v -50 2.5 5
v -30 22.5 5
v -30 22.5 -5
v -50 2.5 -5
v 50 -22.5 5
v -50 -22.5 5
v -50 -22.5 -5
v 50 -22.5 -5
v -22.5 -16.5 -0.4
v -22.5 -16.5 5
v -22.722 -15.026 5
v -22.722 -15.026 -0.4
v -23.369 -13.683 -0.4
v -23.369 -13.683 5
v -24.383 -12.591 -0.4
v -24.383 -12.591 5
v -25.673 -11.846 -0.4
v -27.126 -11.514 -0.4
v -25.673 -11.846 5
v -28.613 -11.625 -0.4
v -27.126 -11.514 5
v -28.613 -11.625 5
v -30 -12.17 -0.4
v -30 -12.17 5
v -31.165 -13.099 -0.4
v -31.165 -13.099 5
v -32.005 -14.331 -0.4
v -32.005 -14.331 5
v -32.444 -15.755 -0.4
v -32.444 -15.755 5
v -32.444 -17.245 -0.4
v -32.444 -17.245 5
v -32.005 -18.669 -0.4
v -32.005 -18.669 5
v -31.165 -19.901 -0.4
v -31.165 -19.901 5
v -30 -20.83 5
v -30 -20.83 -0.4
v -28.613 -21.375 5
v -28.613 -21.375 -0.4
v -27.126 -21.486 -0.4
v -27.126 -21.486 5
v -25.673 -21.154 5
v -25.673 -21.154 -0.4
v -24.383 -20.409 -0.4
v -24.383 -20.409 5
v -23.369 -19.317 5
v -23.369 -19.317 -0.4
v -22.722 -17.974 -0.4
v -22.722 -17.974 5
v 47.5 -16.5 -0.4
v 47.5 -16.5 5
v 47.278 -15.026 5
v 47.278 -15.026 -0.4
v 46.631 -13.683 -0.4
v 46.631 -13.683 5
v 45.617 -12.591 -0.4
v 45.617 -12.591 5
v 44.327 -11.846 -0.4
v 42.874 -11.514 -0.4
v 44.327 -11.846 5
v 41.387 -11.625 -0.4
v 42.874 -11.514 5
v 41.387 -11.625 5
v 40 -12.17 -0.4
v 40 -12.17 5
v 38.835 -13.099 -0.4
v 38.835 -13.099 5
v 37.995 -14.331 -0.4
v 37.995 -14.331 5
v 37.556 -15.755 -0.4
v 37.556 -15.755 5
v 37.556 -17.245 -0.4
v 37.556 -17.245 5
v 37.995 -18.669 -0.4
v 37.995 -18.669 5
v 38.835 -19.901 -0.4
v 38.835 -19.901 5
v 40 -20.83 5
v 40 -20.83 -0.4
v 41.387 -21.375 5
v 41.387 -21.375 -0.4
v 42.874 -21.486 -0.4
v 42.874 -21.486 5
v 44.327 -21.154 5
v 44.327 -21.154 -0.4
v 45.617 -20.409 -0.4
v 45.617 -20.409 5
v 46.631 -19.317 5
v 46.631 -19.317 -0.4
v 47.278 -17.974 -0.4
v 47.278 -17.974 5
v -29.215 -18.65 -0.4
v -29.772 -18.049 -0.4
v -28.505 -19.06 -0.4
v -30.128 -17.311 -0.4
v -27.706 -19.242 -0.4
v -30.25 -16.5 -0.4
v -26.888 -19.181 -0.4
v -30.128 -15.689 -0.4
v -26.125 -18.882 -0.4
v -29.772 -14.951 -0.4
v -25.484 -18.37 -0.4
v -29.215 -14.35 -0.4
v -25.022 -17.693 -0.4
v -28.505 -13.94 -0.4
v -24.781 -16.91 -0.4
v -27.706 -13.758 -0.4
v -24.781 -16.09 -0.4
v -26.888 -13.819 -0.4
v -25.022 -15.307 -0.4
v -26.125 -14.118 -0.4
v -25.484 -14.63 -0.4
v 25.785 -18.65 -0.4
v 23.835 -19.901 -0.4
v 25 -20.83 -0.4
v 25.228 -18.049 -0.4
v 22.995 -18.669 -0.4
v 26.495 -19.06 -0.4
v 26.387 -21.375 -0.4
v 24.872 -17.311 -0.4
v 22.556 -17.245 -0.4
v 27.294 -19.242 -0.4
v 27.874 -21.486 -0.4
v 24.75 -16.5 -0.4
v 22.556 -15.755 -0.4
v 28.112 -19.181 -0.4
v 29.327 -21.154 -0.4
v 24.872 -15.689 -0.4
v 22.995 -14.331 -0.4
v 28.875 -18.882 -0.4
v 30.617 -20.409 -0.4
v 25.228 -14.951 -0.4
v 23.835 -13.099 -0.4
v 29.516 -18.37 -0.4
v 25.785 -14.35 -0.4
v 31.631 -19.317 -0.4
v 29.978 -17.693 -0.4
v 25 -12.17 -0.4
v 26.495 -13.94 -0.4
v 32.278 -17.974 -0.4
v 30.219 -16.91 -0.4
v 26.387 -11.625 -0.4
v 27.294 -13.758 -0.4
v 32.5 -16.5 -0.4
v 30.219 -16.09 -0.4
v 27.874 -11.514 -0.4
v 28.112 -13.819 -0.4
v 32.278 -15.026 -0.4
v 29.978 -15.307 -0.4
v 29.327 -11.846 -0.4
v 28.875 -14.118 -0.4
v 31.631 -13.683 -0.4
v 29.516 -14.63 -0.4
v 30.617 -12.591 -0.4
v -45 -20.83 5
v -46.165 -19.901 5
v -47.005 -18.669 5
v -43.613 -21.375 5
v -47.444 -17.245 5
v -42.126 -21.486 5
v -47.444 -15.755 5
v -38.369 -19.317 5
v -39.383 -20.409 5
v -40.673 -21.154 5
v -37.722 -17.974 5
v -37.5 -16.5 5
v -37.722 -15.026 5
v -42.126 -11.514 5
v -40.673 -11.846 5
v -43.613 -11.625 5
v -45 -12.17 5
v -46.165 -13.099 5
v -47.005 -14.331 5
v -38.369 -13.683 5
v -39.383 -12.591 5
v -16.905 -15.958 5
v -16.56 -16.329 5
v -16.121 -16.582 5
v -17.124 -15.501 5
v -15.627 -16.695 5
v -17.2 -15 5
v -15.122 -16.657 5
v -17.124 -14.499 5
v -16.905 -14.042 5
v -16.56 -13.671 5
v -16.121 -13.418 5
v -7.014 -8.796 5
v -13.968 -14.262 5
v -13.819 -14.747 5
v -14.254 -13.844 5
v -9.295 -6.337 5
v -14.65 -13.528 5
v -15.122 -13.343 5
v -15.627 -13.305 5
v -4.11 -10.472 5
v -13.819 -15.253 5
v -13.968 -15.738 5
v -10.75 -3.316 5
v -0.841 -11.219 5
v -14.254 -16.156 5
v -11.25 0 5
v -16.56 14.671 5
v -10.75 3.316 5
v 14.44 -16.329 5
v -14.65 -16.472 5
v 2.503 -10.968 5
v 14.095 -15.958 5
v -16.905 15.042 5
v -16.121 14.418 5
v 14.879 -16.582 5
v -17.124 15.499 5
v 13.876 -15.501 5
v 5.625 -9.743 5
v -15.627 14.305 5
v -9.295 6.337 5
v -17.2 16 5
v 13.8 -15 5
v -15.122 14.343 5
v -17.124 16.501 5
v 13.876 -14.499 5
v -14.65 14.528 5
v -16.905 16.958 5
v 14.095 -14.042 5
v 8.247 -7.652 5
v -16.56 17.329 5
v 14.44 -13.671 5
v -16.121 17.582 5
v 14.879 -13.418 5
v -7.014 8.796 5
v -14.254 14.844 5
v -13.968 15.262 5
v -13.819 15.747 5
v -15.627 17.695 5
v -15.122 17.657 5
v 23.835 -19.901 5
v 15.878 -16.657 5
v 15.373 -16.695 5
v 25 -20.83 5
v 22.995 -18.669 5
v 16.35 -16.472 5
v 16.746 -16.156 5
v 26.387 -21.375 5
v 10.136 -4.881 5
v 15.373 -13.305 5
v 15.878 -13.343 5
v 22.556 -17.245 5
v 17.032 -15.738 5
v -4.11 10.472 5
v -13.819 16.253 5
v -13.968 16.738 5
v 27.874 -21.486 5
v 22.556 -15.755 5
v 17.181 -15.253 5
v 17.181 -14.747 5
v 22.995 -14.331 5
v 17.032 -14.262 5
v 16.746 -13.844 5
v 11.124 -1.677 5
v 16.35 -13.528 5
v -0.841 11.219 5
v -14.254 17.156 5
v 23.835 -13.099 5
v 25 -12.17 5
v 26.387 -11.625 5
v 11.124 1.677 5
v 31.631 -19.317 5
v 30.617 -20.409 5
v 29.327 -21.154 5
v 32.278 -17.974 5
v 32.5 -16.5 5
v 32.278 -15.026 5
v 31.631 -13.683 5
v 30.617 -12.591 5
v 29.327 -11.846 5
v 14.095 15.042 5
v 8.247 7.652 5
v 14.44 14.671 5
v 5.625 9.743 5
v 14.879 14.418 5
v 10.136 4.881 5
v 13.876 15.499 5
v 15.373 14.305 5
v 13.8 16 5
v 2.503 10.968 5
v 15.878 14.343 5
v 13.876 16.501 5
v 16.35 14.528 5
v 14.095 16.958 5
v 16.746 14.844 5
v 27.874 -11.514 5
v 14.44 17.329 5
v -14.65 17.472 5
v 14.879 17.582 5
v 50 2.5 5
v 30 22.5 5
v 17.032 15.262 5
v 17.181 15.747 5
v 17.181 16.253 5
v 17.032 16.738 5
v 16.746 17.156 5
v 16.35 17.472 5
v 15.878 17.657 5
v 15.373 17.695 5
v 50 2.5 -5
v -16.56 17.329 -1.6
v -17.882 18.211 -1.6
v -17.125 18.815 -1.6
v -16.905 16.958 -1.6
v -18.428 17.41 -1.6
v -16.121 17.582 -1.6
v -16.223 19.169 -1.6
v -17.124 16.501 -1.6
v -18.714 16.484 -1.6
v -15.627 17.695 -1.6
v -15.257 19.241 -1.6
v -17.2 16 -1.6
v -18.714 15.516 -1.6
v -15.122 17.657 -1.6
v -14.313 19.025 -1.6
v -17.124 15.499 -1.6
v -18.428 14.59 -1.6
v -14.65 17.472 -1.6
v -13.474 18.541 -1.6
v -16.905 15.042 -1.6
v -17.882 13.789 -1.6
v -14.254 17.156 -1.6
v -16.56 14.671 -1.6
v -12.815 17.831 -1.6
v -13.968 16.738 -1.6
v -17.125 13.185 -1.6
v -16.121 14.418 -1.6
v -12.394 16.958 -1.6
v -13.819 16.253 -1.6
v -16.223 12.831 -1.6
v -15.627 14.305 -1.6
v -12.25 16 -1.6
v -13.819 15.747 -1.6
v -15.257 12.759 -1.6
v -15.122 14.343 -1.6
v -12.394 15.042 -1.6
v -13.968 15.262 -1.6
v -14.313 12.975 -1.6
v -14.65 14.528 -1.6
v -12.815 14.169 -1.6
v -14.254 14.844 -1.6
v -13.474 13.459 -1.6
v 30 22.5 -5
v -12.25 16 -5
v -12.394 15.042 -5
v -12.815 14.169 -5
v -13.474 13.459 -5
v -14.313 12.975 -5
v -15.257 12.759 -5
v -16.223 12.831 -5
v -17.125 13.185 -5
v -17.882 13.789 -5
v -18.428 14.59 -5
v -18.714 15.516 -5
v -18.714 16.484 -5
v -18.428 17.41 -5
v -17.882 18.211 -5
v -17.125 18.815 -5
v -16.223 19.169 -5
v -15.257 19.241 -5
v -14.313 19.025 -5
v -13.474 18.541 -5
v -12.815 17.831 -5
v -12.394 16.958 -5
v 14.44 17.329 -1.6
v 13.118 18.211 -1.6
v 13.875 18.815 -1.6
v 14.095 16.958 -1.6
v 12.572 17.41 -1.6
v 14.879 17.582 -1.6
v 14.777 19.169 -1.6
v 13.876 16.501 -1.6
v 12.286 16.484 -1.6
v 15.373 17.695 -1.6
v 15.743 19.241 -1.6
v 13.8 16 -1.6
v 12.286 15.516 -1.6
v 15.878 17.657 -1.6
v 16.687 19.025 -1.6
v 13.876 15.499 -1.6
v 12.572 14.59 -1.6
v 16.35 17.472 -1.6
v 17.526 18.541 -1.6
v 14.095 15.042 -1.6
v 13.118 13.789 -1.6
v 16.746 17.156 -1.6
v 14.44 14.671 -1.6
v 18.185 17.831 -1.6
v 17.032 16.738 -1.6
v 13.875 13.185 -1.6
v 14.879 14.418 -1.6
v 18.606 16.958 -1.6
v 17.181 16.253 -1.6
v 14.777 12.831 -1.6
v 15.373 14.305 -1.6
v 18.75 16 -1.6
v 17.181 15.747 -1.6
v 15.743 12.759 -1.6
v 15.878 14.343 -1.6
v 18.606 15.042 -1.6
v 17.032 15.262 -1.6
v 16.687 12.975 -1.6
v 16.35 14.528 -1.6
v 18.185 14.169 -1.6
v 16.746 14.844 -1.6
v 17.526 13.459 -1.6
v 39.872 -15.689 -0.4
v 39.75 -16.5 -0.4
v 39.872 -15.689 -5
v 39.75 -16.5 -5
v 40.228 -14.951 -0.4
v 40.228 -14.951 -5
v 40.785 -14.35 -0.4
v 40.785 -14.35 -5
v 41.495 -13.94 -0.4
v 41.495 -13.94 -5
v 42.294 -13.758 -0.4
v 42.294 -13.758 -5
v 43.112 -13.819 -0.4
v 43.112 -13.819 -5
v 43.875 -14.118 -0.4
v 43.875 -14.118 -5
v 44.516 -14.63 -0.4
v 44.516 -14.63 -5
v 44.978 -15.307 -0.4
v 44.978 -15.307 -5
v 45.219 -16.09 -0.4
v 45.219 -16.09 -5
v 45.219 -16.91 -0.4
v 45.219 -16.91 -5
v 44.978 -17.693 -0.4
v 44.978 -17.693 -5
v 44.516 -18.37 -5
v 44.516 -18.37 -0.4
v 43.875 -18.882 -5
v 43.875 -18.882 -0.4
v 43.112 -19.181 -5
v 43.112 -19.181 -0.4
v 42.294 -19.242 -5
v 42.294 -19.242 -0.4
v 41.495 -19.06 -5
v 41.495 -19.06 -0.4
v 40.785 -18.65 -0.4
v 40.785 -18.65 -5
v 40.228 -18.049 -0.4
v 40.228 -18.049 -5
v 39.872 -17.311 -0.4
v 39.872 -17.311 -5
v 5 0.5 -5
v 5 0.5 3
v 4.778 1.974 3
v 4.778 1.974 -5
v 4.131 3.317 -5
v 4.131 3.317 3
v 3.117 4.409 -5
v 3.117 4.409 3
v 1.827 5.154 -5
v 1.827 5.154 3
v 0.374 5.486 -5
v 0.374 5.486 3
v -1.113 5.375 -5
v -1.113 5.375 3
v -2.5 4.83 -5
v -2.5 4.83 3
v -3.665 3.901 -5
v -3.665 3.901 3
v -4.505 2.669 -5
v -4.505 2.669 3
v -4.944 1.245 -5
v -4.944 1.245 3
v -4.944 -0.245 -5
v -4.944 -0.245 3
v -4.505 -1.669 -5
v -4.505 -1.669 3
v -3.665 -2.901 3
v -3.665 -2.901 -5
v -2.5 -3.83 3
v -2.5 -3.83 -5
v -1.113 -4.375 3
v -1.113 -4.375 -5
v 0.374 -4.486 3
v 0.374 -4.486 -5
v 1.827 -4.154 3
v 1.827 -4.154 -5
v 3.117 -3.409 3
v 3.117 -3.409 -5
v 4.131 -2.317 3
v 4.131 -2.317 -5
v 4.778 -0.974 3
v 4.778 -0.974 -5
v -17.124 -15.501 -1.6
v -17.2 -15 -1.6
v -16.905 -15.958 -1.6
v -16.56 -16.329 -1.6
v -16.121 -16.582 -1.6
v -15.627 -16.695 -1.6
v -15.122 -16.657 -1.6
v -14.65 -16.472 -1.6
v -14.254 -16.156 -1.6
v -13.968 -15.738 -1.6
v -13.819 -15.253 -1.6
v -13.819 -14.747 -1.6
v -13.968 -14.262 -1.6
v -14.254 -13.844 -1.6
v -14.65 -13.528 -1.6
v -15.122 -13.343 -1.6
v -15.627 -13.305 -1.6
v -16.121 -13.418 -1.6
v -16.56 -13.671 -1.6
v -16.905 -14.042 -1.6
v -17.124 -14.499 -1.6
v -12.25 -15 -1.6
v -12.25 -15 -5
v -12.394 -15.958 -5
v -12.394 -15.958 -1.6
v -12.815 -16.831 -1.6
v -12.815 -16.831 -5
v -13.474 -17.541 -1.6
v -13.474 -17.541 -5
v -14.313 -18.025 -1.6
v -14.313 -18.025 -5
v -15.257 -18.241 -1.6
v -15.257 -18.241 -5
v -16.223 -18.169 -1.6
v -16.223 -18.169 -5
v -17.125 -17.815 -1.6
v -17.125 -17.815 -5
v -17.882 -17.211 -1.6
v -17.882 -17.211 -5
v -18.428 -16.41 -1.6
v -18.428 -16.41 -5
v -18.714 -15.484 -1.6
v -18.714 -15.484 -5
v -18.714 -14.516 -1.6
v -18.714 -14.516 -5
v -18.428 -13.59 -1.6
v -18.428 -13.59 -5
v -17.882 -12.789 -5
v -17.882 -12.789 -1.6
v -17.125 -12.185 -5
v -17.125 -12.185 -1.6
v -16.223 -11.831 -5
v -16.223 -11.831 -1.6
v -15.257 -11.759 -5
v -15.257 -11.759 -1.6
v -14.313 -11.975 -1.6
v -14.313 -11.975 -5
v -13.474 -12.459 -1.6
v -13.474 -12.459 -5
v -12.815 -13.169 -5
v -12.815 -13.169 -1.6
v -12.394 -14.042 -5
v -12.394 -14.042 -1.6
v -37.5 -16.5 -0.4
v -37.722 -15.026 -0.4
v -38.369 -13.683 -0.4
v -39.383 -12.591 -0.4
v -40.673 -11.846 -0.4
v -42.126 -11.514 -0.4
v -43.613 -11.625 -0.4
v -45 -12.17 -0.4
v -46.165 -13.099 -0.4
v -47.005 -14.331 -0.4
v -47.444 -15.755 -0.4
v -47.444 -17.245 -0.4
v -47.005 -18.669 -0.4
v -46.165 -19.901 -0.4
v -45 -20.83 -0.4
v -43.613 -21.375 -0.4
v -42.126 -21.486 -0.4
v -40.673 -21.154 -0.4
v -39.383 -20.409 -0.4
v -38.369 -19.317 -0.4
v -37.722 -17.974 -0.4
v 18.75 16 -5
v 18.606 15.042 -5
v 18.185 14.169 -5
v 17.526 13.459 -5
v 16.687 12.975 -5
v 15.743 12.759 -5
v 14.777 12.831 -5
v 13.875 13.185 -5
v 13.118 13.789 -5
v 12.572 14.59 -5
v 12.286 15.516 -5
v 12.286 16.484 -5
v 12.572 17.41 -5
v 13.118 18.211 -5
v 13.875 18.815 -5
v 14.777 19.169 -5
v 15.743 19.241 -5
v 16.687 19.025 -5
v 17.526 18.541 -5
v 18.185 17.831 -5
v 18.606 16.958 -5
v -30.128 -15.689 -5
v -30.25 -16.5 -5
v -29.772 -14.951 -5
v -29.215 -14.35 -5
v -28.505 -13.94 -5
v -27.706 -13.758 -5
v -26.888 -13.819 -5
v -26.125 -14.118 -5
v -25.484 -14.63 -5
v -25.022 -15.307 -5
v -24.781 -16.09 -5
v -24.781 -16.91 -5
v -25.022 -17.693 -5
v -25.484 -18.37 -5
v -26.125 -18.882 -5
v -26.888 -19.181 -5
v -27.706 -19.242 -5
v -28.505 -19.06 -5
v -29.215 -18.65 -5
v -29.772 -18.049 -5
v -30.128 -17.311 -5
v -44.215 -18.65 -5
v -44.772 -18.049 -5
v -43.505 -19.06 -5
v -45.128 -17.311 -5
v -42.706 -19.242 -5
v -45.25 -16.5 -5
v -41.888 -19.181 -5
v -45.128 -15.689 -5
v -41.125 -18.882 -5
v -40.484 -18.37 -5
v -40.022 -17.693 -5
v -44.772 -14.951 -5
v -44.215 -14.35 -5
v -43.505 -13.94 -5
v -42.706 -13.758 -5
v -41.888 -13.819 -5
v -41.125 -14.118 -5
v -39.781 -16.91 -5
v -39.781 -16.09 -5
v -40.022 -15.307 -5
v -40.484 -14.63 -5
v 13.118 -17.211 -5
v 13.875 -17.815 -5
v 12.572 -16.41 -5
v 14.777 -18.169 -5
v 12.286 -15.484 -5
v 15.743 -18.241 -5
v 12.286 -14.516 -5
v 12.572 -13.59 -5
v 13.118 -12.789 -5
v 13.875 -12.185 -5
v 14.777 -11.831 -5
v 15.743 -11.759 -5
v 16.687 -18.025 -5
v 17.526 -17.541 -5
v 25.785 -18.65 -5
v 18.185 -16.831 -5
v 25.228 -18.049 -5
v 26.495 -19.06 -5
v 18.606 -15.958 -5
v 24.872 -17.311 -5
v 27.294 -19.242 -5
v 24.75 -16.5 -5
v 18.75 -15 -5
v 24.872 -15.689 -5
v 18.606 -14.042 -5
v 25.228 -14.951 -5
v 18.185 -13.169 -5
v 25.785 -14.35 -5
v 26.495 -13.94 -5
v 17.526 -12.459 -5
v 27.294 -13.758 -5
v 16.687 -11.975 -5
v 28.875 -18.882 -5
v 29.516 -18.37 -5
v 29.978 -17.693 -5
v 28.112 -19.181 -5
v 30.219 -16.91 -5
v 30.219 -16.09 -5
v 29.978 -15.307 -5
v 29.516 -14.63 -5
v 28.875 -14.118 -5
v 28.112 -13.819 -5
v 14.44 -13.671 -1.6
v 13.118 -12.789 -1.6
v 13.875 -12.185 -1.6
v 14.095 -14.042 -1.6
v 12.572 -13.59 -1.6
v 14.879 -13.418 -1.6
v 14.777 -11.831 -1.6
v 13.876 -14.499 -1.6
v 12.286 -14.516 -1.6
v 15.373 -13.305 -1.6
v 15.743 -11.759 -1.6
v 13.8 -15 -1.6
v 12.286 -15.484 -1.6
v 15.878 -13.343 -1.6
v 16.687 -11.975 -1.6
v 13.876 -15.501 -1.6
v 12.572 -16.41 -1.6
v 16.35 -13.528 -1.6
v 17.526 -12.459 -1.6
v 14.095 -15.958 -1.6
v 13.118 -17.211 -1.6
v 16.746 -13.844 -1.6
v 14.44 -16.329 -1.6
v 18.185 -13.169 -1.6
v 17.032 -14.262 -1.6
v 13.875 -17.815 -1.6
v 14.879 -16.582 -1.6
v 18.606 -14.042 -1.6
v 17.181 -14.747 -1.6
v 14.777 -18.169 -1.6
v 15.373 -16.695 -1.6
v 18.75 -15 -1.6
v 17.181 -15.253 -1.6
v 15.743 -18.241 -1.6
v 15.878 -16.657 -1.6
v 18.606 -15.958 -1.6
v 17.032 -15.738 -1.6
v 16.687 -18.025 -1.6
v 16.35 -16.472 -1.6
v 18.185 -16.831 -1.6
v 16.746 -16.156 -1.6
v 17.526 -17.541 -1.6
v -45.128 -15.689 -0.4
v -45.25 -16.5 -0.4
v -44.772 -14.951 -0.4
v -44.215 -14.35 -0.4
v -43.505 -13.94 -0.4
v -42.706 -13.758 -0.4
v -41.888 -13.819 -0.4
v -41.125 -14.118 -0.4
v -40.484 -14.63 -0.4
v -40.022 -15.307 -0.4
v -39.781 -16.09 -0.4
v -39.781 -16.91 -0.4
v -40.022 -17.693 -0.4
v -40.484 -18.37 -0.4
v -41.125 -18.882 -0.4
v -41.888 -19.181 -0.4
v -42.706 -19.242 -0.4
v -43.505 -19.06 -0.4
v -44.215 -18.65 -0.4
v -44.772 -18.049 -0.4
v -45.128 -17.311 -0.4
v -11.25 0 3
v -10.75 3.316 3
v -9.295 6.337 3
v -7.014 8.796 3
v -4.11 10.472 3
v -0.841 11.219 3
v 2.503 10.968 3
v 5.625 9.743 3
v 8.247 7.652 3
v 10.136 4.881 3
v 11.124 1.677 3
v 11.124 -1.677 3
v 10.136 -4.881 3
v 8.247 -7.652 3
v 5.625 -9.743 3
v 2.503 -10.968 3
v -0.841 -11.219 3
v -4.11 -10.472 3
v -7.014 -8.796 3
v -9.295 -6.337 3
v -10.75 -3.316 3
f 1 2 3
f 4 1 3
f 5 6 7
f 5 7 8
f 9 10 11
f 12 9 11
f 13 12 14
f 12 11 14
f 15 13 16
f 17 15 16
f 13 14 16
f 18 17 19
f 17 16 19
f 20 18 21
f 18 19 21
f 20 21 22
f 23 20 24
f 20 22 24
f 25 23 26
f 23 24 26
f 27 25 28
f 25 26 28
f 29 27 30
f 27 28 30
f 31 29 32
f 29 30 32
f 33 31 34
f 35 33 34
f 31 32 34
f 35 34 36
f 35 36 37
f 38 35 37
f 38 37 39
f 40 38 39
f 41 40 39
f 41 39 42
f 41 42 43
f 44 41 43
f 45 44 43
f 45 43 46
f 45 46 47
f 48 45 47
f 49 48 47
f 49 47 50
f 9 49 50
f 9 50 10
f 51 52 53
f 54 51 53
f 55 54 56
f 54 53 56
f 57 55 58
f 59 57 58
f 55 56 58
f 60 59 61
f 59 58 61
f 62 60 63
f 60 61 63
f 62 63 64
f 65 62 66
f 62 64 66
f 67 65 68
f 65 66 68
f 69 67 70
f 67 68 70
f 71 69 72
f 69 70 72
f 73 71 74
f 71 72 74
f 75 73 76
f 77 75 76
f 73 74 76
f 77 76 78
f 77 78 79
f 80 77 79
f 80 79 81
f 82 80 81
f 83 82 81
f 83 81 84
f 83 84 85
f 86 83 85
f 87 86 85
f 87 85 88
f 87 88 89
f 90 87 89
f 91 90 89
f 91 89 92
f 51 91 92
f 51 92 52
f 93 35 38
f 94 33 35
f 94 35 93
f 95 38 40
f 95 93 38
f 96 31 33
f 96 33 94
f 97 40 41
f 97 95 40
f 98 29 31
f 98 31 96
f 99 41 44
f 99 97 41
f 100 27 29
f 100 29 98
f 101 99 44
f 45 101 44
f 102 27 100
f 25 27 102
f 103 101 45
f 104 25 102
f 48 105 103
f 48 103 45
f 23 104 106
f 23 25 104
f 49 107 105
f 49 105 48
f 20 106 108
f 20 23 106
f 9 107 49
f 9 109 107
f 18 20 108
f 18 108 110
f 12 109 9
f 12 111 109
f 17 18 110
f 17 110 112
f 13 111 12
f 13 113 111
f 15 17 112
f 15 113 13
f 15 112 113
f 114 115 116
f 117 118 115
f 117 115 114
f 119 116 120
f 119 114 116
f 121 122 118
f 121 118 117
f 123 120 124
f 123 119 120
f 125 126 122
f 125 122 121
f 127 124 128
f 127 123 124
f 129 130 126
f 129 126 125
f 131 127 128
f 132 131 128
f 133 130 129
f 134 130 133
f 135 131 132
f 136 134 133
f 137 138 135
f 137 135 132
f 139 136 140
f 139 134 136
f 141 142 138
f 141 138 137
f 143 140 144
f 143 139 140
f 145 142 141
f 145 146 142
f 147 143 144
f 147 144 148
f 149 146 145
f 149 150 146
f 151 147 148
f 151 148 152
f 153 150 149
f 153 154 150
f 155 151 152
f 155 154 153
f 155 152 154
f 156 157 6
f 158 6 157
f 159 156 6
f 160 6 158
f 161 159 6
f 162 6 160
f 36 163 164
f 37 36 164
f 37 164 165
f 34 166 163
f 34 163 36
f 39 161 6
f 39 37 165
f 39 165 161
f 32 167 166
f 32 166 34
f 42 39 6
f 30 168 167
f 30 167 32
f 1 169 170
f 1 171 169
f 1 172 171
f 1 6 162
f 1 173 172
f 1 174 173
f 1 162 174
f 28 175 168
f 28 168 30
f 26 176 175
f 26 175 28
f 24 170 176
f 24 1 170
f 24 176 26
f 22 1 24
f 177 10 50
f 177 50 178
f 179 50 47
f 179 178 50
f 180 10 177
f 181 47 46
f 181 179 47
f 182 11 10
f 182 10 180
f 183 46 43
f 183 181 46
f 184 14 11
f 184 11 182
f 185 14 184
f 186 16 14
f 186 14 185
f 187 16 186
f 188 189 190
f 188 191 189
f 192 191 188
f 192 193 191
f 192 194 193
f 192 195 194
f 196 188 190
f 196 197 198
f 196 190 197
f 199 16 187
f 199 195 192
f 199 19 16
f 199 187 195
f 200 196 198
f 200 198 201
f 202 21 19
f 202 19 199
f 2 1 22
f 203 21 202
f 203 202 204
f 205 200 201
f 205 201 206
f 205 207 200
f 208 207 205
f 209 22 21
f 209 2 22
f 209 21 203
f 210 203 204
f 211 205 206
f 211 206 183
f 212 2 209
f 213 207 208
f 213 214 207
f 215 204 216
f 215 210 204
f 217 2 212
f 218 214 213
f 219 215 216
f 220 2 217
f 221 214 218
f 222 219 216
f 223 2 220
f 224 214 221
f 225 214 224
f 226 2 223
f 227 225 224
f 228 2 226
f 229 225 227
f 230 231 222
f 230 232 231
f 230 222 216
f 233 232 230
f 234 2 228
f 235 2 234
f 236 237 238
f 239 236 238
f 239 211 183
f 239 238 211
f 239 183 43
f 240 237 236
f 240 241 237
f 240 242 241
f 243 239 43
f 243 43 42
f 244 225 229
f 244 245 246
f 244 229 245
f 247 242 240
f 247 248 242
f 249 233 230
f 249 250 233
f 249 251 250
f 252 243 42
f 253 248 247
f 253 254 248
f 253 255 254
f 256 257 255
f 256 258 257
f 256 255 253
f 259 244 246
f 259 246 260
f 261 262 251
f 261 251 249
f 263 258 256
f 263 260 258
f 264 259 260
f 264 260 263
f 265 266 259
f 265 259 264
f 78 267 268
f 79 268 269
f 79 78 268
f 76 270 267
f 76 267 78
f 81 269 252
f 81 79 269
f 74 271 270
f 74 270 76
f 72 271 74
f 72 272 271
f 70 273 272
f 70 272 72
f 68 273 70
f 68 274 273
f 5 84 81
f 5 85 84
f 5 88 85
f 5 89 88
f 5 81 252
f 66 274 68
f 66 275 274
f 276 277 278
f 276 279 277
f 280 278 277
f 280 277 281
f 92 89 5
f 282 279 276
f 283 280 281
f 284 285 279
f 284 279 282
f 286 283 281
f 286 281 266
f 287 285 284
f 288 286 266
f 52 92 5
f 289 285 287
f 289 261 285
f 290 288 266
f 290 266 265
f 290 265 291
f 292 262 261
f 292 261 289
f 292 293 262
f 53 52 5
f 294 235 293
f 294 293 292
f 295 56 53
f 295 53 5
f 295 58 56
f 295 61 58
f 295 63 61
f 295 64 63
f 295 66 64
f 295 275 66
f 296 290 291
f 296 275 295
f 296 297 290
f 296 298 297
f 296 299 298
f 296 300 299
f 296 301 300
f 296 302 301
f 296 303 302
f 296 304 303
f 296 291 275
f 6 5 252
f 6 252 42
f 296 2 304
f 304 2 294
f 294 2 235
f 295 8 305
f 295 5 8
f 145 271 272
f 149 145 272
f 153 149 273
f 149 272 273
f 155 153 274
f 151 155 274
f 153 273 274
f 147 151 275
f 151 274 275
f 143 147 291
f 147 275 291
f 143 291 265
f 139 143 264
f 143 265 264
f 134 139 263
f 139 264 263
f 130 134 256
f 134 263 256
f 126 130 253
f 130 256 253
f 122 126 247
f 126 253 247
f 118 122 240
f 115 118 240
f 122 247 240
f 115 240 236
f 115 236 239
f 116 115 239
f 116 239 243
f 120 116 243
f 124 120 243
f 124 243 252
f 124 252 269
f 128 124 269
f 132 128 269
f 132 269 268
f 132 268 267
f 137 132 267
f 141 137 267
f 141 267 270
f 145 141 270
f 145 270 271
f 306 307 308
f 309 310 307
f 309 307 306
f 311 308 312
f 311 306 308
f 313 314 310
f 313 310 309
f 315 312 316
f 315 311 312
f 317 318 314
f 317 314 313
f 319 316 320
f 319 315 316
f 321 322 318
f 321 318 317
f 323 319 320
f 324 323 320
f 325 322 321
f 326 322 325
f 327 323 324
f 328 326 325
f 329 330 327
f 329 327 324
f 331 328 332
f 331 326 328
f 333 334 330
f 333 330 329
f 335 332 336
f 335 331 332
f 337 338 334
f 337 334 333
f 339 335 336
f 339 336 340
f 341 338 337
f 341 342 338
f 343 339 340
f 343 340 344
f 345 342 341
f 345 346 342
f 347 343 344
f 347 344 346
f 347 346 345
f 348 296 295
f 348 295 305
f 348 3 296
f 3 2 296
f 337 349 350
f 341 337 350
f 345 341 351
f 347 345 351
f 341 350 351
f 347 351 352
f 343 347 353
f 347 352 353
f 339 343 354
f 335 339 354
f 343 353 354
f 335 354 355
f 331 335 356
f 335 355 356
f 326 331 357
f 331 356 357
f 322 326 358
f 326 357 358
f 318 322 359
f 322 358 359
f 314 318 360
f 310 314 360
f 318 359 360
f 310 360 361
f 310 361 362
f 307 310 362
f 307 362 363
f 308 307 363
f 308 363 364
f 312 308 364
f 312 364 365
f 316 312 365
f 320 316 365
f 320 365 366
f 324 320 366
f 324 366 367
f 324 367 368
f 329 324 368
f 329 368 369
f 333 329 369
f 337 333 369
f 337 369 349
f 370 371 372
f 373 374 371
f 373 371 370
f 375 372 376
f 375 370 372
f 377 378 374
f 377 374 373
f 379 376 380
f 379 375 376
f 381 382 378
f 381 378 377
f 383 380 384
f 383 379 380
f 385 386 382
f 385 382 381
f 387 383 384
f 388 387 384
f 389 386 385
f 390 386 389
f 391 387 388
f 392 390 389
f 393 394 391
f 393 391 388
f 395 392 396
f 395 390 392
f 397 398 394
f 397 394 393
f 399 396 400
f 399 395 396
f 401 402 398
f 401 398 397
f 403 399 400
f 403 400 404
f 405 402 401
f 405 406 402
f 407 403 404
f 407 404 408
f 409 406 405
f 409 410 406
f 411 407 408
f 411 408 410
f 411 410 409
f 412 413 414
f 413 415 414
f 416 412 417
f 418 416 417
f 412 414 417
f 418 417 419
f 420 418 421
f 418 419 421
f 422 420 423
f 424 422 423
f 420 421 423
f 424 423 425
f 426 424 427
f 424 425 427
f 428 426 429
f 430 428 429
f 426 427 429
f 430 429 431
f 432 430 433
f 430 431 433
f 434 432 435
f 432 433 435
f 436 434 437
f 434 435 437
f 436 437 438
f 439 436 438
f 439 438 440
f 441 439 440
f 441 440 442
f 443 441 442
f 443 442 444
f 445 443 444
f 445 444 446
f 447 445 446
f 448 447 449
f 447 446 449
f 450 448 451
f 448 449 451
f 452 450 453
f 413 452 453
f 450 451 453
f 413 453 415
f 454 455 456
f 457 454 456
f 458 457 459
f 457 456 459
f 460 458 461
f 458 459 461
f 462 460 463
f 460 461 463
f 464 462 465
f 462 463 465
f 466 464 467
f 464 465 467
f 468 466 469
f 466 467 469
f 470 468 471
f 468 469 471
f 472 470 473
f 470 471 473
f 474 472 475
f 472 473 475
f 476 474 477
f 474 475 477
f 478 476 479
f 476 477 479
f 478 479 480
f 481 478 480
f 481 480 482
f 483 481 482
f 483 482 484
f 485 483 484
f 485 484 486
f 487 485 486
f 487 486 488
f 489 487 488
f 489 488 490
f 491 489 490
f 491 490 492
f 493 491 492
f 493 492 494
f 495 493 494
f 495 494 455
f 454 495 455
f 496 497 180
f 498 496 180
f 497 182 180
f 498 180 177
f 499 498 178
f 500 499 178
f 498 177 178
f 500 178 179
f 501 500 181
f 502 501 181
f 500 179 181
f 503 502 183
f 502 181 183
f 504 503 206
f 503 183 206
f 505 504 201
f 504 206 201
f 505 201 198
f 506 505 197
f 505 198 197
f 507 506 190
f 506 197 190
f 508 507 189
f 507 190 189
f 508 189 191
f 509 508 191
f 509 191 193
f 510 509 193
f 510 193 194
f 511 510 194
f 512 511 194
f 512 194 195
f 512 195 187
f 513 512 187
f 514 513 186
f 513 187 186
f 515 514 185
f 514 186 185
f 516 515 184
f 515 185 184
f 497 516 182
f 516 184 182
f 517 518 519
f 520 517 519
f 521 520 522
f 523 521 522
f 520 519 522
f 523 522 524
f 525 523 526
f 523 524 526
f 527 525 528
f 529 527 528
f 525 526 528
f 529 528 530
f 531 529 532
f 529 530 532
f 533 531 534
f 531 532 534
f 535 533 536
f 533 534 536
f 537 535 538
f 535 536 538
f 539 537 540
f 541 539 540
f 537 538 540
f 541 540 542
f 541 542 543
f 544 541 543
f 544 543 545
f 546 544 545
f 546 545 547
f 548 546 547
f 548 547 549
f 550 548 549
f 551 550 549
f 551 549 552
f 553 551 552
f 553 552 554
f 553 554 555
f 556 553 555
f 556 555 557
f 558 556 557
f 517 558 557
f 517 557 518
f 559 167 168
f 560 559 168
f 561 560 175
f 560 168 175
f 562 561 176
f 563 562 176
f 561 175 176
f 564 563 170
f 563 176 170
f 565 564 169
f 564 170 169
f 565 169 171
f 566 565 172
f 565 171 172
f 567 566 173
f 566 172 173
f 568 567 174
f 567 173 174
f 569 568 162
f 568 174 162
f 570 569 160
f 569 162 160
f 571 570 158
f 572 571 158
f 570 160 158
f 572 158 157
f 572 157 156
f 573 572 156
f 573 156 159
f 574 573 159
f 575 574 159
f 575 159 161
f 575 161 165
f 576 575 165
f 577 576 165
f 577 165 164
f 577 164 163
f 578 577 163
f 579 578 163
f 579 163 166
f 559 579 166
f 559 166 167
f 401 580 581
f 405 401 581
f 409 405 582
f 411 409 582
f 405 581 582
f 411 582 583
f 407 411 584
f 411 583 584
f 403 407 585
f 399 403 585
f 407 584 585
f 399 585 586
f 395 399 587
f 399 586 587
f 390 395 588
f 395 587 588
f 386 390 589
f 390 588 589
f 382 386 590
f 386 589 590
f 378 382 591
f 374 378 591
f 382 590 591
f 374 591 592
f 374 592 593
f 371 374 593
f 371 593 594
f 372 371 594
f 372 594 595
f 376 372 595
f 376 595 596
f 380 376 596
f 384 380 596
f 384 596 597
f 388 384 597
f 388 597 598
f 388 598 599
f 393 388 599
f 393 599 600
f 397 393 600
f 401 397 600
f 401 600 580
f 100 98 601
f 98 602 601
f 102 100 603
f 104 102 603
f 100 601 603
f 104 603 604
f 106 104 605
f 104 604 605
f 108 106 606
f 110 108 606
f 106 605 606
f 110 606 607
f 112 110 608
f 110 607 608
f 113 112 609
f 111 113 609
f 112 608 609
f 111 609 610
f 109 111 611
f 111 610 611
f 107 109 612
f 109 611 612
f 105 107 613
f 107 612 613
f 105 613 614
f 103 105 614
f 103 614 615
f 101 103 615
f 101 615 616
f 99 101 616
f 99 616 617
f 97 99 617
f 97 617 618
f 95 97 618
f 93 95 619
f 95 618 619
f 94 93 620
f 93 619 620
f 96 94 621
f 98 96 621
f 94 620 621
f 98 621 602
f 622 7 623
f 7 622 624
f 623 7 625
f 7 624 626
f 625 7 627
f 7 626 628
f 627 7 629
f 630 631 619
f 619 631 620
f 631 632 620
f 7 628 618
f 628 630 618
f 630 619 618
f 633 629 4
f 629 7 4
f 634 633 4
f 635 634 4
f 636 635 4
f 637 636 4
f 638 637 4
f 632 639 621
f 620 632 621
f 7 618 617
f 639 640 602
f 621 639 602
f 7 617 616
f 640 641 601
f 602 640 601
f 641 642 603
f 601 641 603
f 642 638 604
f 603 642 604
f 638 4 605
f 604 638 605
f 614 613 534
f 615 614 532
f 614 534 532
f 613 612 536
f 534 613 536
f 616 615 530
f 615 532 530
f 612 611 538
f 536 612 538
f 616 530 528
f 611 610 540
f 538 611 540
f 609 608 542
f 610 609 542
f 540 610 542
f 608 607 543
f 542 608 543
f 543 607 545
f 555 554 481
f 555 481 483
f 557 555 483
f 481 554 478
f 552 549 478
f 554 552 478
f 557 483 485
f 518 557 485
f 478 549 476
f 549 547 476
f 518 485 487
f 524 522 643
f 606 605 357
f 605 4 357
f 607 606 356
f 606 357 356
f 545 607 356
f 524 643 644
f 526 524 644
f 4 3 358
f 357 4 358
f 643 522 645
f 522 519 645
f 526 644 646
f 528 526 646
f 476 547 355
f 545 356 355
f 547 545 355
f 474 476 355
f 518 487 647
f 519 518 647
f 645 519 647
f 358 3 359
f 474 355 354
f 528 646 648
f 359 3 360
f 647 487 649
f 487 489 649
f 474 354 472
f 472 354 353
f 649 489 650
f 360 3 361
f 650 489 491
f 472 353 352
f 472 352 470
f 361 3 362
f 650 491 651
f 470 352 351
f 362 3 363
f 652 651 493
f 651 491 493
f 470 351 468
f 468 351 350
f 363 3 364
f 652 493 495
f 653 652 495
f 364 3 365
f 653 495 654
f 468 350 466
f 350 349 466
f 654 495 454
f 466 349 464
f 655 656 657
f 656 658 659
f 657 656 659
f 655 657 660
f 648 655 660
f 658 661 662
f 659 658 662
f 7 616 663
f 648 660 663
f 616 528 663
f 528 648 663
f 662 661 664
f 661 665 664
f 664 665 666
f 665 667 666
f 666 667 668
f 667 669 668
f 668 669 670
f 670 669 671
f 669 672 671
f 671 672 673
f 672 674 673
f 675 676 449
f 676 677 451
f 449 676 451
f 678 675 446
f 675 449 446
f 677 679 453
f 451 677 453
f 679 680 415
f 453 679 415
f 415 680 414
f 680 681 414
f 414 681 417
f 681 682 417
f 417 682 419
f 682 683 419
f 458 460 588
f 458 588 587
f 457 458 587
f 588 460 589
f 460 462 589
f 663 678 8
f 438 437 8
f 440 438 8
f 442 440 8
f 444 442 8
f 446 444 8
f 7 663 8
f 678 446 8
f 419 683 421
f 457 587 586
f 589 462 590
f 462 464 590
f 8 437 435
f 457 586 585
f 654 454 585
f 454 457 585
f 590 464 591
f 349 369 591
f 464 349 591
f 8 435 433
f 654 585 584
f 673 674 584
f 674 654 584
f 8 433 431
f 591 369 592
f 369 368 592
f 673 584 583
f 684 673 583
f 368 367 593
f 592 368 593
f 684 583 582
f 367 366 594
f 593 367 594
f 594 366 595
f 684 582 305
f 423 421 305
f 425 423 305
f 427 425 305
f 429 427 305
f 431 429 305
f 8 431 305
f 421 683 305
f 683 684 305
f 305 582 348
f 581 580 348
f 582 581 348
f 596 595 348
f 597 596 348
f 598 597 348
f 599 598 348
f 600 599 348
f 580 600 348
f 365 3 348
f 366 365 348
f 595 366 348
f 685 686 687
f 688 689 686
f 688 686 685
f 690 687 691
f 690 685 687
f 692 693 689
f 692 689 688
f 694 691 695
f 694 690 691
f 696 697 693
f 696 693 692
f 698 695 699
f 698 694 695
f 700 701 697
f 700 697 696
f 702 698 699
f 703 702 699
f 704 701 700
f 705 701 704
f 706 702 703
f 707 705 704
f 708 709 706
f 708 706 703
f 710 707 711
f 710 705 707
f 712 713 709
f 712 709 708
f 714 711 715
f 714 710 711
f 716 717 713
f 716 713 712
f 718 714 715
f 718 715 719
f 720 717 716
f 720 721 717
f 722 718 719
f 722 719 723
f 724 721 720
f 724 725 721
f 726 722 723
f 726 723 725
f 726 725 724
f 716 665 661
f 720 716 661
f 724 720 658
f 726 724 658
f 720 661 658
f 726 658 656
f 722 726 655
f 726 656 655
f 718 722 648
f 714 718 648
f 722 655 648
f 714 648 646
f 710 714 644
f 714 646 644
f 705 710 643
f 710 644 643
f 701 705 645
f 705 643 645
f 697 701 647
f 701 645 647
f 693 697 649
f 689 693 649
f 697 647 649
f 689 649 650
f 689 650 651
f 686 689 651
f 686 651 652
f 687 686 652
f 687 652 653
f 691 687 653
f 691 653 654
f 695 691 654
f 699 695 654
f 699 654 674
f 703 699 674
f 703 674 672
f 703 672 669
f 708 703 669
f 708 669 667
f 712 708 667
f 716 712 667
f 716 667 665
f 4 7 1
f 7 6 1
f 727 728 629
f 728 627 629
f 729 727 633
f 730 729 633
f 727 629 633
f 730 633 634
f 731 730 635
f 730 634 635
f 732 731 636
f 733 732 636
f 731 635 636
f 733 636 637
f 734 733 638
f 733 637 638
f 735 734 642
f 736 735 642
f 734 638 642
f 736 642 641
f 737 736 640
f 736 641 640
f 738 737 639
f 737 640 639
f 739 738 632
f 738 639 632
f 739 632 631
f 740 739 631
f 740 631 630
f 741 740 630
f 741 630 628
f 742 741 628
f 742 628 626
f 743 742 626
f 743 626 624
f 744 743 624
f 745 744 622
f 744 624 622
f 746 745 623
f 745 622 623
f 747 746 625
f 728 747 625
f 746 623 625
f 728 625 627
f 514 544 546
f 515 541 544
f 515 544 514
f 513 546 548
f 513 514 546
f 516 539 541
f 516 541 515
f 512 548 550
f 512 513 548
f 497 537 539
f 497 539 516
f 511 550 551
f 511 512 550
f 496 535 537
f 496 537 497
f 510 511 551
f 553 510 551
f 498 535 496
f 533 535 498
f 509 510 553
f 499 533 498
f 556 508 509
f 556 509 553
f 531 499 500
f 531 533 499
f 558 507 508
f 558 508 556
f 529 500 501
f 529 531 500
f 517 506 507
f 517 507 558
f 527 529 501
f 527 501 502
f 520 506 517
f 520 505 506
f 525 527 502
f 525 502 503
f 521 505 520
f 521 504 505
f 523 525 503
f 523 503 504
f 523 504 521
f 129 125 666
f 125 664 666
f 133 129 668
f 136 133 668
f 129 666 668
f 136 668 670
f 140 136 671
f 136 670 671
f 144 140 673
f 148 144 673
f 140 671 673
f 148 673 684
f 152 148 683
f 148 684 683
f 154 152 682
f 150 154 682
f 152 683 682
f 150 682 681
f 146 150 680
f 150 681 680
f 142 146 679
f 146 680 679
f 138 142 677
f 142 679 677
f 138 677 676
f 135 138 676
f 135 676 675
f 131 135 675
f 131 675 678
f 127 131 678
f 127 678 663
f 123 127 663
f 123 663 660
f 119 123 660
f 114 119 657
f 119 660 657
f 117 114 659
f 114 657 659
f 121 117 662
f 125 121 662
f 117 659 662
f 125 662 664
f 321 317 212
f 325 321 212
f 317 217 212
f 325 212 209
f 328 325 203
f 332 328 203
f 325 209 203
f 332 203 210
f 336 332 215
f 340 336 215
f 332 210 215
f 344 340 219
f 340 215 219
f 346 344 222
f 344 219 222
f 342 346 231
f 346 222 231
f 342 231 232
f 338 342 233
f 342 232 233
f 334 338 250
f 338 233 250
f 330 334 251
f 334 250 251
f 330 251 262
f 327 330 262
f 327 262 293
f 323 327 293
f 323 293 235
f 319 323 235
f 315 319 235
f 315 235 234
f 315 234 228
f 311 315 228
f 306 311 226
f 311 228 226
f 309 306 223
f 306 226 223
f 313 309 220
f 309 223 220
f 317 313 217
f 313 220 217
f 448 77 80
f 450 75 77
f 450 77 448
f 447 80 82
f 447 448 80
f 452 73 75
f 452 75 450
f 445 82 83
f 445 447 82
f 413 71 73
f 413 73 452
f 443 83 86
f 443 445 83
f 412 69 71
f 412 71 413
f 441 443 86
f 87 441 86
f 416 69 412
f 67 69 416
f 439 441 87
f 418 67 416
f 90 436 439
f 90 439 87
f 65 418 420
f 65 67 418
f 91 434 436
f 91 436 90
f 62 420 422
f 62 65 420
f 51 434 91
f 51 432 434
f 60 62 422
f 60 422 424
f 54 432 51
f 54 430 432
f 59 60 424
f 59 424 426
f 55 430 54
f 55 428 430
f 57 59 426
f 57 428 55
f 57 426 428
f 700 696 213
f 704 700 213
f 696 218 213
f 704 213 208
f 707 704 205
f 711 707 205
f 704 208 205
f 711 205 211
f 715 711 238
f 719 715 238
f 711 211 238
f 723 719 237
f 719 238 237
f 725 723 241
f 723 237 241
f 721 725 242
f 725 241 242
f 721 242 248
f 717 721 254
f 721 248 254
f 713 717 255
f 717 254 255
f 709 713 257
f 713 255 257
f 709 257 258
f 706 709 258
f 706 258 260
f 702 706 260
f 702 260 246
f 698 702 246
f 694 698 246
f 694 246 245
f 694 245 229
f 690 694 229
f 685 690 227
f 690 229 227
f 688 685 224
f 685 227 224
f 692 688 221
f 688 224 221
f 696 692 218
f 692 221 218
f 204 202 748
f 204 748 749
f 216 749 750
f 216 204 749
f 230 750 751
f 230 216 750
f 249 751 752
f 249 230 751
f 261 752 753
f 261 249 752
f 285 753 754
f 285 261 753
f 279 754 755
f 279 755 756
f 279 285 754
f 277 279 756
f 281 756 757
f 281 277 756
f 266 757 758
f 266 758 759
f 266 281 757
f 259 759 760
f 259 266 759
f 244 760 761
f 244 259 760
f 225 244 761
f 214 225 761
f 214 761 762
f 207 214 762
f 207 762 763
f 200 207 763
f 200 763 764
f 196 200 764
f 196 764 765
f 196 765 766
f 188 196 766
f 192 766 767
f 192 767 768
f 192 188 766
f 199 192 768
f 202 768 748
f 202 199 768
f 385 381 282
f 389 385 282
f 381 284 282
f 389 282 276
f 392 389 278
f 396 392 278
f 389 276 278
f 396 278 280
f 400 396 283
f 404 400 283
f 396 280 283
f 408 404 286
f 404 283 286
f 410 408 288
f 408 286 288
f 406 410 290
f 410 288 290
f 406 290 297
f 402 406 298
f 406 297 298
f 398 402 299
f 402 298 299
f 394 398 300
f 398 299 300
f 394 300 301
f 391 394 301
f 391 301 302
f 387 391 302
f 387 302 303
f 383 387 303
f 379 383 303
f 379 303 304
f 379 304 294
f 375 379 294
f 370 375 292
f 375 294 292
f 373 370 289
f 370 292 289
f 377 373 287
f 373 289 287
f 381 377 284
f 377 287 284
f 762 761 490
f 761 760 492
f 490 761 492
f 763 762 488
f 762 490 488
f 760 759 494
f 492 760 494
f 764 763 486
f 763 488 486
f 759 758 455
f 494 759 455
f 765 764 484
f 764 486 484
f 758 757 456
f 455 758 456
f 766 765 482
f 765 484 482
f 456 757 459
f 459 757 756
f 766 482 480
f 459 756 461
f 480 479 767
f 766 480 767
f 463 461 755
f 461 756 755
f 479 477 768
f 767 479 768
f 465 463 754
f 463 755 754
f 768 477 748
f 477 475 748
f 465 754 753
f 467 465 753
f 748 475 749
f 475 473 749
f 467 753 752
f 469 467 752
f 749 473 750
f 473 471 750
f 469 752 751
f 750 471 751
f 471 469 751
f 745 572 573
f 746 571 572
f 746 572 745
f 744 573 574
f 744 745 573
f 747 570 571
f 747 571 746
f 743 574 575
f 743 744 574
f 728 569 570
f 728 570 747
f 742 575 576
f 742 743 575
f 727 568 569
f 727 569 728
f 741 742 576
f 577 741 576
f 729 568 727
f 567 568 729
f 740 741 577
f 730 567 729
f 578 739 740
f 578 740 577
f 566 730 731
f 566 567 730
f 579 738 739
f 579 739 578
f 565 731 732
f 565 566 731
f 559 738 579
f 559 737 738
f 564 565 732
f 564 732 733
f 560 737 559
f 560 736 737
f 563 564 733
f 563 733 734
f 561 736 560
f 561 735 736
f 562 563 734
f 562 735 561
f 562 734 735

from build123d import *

# Parameters (mm, degrees)
SKETCH1_W                                           = 100
SKETCH1_H                                           = 45
BOSS_EXTRUDE1_DEPTH                                 = 5
CHAMFER1_SIZE                                       = 20
CBORE_FOR_M5_HEX_SOCKET_HEAD_CAP_SCREW2_D           = 5.5
CBORE_FOR_M5_HEX_SOCKET_HEAD_CAP_SCREW2_CBORE_D     = 10
CBORE_FOR_M5_HEX_SOCKET_HEAD_CAP_SCREW2_CBORE_DEPTH = 5.4
CBORE_FOR_M3_HEX_SOCKET_HEAD_CAP_SCREW1_D           = 3.4
CBORE_FOR_M3_HEX_SOCKET_HEAD_CAP_SCREW1_CBORE_D     = 6.5
CBORE_FOR_M3_HEX_SOCKET_HEAD_CAP_SCREW1_CBORE_DEPTH = 3.4
SKETCH2_R                                           = 5
CUT_EXTRUDE3_DEPTH                                  = 10
SKETCH12_R                                          = 11.25
CUT_EXTRUDE4_DEPTH                                  = 2


with BuildPart() as part:
    # Sketch1 → Boss-Extrude1 (new, symmetric)
    with BuildSketch(Plane.XY):
        Rectangle(SKETCH1_W, SKETCH1_H)
    extrude(amount=BOSS_EXTRUDE1_DEPTH, both=True)

    # Chamfer1
    chamfer1_edges = [part.edges().sort_by_distance(p)[0] for p in [
        (-50, 22.5, 0),
        (50, 22.5, 0),
    ]]
    chamfer(chamfer1_edges, length=CHAMFER1_SIZE)

    # CBORE for M5 Hex Socket Head Cap Screw2 (through all)
    with Locations(Plane.XY.offset(5)):
        with Locations((-42.5, -16.5), (-27.5, -16.5), (27.5, -16.5), (42.5, -16.5)):
            CounterBoreHole(CBORE_FOR_M5_HEX_SOCKET_HEAD_CAP_SCREW2_D / 2, CBORE_FOR_M5_HEX_SOCKET_HEAD_CAP_SCREW2_CBORE_D / 2, CBORE_FOR_M5_HEX_SOCKET_HEAD_CAP_SCREW2_CBORE_DEPTH)

    # CBORE for M3 Hex Socket Head Cap Screw1 (through all)
    with Locations(Plane(origin=(0, 0, -5), x_dir=(1, 0, 0), z_dir=(0, 0, -1))):
        with Locations((-15.5, -16), (15.5, -16), (15.5, 15), (-15.5, 15)):
            CounterBoreHole(CBORE_FOR_M3_HEX_SOCKET_HEAD_CAP_SCREW1_D / 2, CBORE_FOR_M3_HEX_SOCKET_HEAD_CAP_SCREW1_CBORE_D / 2, CBORE_FOR_M3_HEX_SOCKET_HEAD_CAP_SCREW1_CBORE_DEPTH)

    # Sketch2 → Cut-Extrude3 (cut)
    with BuildSketch(Plane.XY.offset(5)):
        with Locations((0, 0.5)):
            Circle(SKETCH2_R)
    extrude(amount=-CUT_EXTRUDE3_DEPTH, mode=Mode.SUBTRACT)

    # Sketch12 → Cut-Extrude4 (cut)
    with BuildSketch(Plane(origin=(0, 0, 5), x_dir=(-1, 0, 0), z_dir=(0, 0, -1))):
        Circle(SKETCH12_R)
    extrude(amount=CUT_EXTRUDE4_DEPTH, mode=Mode.SUBTRACT)


solid = part.part
